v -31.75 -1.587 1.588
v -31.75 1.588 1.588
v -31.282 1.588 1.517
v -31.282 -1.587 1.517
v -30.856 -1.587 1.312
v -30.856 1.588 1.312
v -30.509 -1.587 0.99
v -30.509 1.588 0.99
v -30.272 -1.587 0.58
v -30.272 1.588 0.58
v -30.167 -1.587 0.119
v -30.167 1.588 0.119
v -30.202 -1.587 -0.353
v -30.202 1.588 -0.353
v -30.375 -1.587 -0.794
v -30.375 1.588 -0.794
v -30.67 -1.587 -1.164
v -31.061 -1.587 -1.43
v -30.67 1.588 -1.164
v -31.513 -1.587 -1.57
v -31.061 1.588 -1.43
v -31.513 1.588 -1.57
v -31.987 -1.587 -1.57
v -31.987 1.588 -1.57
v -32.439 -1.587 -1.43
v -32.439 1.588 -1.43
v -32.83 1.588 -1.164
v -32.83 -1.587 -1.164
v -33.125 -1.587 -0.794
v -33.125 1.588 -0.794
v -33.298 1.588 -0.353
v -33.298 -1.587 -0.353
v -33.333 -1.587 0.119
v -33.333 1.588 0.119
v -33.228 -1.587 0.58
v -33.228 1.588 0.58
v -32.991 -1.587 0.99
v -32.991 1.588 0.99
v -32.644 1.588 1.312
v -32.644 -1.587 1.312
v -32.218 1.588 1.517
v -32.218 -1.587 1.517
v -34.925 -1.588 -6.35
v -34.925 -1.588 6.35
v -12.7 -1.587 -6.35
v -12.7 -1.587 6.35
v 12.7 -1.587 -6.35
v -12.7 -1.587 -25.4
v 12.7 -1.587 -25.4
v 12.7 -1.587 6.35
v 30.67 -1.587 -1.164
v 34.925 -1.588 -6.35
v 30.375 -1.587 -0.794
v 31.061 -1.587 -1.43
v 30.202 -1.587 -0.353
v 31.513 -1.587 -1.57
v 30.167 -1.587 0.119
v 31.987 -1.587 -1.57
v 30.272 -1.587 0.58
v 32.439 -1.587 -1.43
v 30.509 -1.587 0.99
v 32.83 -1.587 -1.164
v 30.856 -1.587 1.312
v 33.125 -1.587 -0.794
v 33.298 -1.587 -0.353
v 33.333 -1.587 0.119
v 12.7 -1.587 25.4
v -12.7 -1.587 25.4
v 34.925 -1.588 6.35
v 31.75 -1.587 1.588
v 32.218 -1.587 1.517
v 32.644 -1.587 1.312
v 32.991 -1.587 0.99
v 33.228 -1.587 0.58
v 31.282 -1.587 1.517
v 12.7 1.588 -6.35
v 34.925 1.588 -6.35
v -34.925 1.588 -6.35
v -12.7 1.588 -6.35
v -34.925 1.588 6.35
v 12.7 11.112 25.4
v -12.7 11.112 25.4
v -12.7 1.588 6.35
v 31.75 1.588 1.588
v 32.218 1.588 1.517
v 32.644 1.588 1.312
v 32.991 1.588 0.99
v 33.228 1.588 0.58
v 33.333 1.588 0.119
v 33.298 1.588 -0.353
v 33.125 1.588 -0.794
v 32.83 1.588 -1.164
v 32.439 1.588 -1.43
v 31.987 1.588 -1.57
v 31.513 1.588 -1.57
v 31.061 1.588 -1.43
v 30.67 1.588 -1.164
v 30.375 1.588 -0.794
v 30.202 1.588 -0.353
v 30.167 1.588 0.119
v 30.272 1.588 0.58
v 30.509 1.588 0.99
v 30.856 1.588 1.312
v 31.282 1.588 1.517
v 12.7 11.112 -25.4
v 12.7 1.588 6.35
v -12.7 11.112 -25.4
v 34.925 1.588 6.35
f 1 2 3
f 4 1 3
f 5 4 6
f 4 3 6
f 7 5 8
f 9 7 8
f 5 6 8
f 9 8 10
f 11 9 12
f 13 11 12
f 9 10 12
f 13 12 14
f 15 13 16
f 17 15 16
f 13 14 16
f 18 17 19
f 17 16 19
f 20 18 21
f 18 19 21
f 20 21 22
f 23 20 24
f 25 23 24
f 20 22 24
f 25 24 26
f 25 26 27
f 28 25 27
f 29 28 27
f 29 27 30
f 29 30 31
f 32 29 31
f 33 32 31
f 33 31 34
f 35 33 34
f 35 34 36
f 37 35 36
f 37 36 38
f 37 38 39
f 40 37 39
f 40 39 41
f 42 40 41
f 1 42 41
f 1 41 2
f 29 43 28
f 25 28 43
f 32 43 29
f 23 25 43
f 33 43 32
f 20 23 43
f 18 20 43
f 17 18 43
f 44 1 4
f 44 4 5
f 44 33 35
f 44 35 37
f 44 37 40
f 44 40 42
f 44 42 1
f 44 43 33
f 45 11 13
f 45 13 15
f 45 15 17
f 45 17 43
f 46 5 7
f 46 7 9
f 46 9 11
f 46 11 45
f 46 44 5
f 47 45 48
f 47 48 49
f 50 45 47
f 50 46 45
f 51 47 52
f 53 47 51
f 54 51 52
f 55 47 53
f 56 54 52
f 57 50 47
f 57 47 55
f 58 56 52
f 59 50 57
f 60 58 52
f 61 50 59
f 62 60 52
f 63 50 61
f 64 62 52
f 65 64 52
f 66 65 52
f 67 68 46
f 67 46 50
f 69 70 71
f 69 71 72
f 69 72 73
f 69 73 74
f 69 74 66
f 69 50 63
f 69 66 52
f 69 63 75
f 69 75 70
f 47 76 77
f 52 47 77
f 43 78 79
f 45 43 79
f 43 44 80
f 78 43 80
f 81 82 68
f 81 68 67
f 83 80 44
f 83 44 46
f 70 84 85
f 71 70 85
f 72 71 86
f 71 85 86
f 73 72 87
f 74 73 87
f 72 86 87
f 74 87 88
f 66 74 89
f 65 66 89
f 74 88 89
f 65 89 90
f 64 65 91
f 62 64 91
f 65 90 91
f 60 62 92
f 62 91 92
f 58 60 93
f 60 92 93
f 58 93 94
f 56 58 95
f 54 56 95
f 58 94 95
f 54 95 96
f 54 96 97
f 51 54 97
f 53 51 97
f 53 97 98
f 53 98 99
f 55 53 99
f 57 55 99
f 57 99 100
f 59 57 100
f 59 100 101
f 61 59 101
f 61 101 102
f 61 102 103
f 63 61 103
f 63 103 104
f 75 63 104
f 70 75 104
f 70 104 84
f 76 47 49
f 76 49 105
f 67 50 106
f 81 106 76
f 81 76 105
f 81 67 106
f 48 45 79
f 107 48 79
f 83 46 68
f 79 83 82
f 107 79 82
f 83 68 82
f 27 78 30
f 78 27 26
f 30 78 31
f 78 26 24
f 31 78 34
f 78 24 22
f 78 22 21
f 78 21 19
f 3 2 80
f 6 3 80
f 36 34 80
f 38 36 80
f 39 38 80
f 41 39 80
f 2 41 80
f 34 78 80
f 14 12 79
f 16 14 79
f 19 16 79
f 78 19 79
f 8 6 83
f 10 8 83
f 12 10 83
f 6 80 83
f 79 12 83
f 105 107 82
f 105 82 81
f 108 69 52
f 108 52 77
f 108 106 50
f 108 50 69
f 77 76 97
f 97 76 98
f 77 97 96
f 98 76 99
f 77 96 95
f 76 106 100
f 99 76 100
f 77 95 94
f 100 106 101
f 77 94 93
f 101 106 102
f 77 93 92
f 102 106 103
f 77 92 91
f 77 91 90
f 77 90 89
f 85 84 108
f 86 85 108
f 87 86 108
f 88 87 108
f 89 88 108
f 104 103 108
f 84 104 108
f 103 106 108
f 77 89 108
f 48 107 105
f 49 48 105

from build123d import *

# Parameters (mm, degrees)
SKETCH2_W           = 69.85
SKETCH2_H           = 3.175
BOSS_EXTRUDE1_DEPTH = 6.35
SKETCH5_W           = 25.4
SKETCH5_H           = 12.7
BOSS_EXTRUDE2_DEPTH = 25.4
SKETCH6_R           = 1.5875
CUT_EXTRUDE1_DEPTH  = 45.22263278


with BuildPart() as part:
    # Sketch2 → Boss-Extrude1 (new, symmetric)
    with BuildSketch(Plane.XY):
        Rectangle(SKETCH2_W, SKETCH2_H)
    extrude(amount=BOSS_EXTRUDE1_DEPTH, both=True)

    # Sketch5 → Boss-Extrude2 (add, symmetric)
    with BuildSketch(Plane.XY):
        with Locations((0, 4.7625)):
            Rectangle(SKETCH5_W, SKETCH5_H)
    extrude(amount=BOSS_EXTRUDE2_DEPTH, both=True)

    # Sketch6 → Cut-Extrude1 (cut, through all)
    with BuildSketch(Plane(origin=(0, 1.5875, 0), x_dir=(1, 0, 0), z_dir=(0, 1, 0))):
        with Locations(Location((-31.75, 0, 0), (0, 0, 270))):
            Circle(SKETCH6_R)
        with Locations(Location((31.75, 0, 0), (0, 0, 270))):
            Circle(SKETCH6_R)
    extrude(amount=-CUT_EXTRUDE1_DEPTH, mode=Mode.SUBTRACT)


solid = part.part
